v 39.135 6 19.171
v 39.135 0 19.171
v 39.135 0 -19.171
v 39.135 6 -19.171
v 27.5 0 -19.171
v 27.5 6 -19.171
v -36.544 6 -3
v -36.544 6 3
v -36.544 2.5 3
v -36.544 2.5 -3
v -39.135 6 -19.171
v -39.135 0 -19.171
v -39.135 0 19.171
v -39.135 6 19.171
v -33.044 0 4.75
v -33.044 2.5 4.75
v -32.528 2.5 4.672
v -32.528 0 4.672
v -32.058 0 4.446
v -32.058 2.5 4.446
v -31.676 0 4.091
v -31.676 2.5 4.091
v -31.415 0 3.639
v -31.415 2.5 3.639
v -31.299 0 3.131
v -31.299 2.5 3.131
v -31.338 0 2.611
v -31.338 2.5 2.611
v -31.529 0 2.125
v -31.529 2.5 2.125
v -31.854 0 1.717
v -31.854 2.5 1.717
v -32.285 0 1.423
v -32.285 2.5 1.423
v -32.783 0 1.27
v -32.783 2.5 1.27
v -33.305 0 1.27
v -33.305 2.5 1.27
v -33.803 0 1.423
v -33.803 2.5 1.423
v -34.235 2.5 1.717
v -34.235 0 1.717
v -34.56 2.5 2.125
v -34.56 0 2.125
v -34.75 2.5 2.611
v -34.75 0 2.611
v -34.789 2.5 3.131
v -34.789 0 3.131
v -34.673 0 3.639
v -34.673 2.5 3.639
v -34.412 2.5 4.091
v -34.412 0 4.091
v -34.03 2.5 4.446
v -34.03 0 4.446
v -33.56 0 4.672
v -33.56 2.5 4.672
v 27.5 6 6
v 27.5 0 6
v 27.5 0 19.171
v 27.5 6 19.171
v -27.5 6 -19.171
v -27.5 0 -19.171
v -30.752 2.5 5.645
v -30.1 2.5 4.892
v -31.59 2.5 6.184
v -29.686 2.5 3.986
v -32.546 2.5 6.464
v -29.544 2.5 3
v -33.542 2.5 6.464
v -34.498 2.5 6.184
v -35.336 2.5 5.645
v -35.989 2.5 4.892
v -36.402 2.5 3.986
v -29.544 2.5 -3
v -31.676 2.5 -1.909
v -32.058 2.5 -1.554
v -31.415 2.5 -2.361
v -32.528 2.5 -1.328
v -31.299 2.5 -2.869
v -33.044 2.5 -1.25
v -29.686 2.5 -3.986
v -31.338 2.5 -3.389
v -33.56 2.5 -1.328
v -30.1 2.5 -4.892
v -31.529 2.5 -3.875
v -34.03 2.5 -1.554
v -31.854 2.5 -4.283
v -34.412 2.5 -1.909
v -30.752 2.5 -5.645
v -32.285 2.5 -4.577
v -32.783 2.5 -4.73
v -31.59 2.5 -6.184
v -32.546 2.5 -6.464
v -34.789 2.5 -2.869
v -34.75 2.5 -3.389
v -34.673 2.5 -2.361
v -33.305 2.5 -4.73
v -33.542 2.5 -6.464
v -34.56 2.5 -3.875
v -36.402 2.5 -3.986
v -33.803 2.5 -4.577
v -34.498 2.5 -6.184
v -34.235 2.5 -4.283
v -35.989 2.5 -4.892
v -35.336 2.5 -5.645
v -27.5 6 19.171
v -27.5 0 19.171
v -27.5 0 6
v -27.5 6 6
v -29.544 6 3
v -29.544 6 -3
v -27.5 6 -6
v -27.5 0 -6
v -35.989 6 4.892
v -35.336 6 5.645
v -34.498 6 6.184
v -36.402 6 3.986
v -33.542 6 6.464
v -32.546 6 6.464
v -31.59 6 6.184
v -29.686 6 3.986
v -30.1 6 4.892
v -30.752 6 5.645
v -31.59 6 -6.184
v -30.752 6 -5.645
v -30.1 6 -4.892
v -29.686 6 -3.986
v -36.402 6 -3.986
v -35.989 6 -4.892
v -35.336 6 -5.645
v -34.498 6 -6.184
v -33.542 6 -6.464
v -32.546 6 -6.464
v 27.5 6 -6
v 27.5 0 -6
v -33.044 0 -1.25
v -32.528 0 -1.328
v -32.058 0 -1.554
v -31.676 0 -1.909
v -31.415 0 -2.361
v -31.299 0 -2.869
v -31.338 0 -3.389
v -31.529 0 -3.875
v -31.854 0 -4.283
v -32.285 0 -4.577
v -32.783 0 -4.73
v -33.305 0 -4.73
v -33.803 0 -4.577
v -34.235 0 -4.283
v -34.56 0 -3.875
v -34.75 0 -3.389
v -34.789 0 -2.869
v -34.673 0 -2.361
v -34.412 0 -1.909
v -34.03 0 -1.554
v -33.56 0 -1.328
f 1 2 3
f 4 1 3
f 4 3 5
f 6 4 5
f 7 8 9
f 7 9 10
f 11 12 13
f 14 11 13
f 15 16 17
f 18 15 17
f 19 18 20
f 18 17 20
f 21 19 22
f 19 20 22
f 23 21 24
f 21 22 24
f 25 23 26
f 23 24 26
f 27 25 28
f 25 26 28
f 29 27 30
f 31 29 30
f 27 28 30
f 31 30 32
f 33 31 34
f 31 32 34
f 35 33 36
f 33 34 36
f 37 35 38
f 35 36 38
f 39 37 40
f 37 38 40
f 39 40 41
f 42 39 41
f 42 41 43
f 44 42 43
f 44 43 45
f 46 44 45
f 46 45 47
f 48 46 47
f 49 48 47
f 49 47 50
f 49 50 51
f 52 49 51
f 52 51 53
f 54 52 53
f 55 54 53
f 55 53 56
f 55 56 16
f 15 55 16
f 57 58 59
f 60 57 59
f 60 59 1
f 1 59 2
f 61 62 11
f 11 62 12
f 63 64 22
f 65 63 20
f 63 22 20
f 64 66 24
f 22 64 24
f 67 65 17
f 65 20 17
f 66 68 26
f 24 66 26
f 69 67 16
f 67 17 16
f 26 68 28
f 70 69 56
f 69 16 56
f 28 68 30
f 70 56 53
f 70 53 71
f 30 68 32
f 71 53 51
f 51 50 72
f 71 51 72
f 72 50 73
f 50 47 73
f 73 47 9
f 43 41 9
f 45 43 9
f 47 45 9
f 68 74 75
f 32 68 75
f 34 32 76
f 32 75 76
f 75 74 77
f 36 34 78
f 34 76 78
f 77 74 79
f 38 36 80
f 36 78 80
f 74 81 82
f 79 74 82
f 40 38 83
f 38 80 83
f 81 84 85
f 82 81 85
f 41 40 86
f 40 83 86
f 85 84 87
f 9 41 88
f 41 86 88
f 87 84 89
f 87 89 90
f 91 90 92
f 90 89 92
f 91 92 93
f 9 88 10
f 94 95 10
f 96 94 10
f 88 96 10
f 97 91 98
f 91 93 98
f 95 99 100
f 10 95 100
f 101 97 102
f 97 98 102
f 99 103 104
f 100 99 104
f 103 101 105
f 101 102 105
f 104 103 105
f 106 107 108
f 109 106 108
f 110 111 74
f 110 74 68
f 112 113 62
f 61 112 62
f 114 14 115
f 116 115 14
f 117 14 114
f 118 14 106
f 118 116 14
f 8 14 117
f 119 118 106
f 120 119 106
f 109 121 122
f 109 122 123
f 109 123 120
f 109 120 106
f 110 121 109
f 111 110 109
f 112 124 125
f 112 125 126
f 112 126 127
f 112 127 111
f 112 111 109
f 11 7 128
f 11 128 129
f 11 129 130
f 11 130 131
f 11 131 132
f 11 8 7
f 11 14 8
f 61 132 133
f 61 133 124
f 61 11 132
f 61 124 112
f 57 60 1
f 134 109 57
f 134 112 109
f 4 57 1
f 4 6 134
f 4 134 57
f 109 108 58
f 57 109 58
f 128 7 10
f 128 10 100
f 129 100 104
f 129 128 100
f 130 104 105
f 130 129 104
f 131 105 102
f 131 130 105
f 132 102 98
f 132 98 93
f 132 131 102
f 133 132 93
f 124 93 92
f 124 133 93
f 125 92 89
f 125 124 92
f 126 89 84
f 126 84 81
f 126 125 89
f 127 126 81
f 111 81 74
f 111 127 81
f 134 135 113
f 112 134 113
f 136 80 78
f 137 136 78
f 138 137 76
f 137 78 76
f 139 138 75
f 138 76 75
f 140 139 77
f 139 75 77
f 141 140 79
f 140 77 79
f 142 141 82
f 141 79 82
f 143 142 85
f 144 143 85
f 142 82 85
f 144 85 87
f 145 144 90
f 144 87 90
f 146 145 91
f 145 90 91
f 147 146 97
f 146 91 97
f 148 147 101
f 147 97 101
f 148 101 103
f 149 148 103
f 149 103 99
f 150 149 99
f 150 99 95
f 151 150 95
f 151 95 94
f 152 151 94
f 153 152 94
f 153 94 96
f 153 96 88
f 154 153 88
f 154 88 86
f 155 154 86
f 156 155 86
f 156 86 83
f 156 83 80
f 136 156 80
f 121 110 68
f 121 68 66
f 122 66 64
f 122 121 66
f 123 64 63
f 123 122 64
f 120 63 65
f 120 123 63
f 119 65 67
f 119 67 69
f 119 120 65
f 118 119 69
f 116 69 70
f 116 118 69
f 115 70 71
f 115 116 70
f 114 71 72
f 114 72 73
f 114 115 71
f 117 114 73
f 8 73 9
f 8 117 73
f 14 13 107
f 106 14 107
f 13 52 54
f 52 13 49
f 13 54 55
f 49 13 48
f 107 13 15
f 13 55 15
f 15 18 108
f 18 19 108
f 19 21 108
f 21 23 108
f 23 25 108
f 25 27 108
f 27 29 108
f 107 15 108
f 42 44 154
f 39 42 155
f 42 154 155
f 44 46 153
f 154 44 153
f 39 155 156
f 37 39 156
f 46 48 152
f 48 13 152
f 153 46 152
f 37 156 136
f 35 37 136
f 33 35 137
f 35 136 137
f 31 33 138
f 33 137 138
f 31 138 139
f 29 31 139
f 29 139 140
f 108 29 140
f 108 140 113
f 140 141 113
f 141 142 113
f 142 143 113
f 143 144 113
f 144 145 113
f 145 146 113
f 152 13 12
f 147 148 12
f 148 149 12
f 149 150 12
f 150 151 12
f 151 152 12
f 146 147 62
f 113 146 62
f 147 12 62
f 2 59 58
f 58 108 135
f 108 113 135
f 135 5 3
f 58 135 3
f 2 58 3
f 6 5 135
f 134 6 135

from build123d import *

# Parameters (mm, degrees)
BOSS_EXTRUDE1_DEPTH = 6
CUT_EXTRUDE2_DEPTH  = 3.5
SKETCH5_R           = 1.75
CUT_EXTRUDE3_DEPTH  = 4


with BuildPart() as part:
    # Sketch2 → Boss-Extrude1 (new body)
    with BuildSketch(Plane(origin=(0, 0, 0), x_dir=(1, 0, 0), z_dir=(0, 1, 0))):
        Polygon((-27.5, -6), (-27.5, 6), (-27.5, 19.170673077), (-39.134615385, 19.170673077), (-39.134615385, -19.170673077), (-27.5, -19.170673077), align=None)
        Polygon((0, -6), (0, 0), (0, 6), (-27.5, 6), (-27.5, -6), align=None)
        Polygon((0, 6), (0, 0), (0, -6), (27.5, -6), (27.5, 6), align=None)
        Polygon((27.5, 19.170673077), (27.5, 6), (27.5, -6), (27.5, -19.170673077), (39.134615385, -19.170673077), (39.134615385, 19.170673077), align=None)
    extrude(amount=BOSS_EXTRUDE1_DEPTH)

    # Sketch3 → Cut-Extrude2 (cut)
    with BuildSketch(Plane(origin=(0, 6, 0), x_dir=(1, 0, 0), z_dir=(0, 1, 0))):
        with BuildLine():
            Line((-29.544200918, 3), (-29.544200918, -3))
            ThreePointArc((-29.544200918, -3), (-33.044200918, -6.5), (-36.544200918, -3))
            Line((-36.544200918, -3), (-36.544200918, 3))
            ThreePointArc((-36.544200918, 3), (-33.044200918, 6.5), (-29.544200918, 3))
        make_face()
    extrude(amount=-CUT_EXTRUDE2_DEPTH, mode=Mode.SUBTRACT)

    # Sketch5 → Cut-Extrude3 (cut)
    with BuildSketch(Plane(origin=(0, 2.5, 0), x_dir=(1, 0, 0), z_dir=(0, 1, 0))):
        with Locations(Location((-33.044200918, 3, 0), (0, 0, 270))):
            Circle(SKETCH5_R)
        with Locations(Location((-33.044200918, -3, 0), (0, 0, 270))):
            Circle(SKETCH5_R)
    extrude(amount=-CUT_EXTRUDE3_DEPTH, mode=Mode.SUBTRACT)


solid = part.part
